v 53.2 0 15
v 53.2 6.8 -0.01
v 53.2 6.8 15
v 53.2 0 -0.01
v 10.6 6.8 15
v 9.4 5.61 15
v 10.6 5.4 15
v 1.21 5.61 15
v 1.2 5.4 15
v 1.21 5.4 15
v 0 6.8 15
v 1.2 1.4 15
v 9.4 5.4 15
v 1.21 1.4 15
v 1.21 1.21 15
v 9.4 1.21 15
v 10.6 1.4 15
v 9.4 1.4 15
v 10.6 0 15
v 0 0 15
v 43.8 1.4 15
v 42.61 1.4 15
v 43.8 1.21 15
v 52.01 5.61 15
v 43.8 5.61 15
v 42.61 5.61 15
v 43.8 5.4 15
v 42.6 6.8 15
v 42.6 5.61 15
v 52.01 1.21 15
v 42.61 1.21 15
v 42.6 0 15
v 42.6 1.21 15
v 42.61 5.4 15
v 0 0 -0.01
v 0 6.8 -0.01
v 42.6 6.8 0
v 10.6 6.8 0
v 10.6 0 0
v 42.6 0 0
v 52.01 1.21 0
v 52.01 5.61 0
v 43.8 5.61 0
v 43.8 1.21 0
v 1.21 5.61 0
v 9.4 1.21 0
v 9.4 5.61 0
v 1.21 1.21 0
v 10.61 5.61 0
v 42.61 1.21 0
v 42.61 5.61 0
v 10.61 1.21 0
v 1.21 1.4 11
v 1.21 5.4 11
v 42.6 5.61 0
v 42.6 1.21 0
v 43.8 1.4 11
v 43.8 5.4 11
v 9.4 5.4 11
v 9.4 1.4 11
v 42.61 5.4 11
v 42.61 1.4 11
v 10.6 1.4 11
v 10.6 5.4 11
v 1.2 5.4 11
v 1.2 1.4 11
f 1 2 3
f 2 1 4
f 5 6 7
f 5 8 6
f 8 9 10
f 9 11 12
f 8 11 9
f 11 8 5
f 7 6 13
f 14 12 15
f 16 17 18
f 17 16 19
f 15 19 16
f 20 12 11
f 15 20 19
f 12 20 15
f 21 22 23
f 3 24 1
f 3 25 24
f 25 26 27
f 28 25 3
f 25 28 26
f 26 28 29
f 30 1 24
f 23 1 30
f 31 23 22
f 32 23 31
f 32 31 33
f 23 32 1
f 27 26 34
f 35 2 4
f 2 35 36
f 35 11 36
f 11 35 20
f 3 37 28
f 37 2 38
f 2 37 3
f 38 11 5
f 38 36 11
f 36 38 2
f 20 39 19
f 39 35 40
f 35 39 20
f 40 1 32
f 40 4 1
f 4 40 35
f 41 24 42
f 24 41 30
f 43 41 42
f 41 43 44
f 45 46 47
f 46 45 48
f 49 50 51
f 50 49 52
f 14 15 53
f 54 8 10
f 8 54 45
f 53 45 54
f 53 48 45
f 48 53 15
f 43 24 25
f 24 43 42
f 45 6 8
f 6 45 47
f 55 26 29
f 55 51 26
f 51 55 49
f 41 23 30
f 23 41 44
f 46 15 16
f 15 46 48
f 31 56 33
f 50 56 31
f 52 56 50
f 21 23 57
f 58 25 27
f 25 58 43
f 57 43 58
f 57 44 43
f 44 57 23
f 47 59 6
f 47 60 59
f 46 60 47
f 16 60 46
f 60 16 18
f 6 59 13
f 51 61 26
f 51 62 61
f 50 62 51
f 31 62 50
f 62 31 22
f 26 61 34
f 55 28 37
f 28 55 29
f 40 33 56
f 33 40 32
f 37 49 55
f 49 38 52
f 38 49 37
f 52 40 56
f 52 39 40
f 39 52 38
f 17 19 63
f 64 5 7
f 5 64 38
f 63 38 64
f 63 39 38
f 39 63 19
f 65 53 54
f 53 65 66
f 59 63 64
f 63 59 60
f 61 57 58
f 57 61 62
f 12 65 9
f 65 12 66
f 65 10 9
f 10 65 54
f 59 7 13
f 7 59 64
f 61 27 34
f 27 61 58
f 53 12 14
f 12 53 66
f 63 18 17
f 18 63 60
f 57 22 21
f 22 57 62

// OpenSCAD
// file: ../Base/Boxes.scad
// Fischertechnik Box Foundation
// Pre-designed Boxes

use <Constants.scad>

include <PlacementOptions.scad>

box190Width = 190;
box190Depth = 130;
box130Width = 130;
box130Depth = 95;

// Values are from an original ec3 box
topBottomDifference = 1.5;
outerHeight = 40;
baseThickness = 1.8;
innerHeight = outerHeight - baseThickness;
stackExcess = 5.7;
radius = 3.5;
wallThickness = 1.5;
tolerance = 0.2;

boxWallThickness = wallThickness;
boxBaseThickness = baseThickness;
boxWebWidth = 3.0;

// getBoxWallThickness()
// Gets the wall thickness of a Fischertechnik Box
function getBoxWallThickness() = boxWallThickness;

// getBoxUsageHeight(height = 38.2)
// Gets the usable height of a Fischertechnik box
// height = Outer height of the box from the bottom to the upper edge.
function getBoxUsageHeight(height = outerHeight) = height - baseThickness - stackExcess;

// getBoxInnerHeight()
// Gets the inner height of a Fischertechnik box, including the stack excess
function getBoxInnerHeight() = innerHeight;

// getBoxBaseThickness()
// Gets the thickness of the Fischertechnik box base.
function getBoxBaseThickness() = boxBaseThickness;

// getBoxWebWidth()
// Gets the width of a box web
function getBoxWebWidth() = boxWebWidth;

// getBox190Space()
// Gets the usable inner space of a Box 190 as an x/y-list
function getBox190Space() = [
    box190Width - 2*getBoxWallThickness() - topBottomDifference, 
    box190Depth - 2*getBoxWallThickness() - topBottomDifference ];

// RoundedCornerPlate(width, depth, height, radius)
// Creates a body plate with rounded corners for a box. Used
// also to create the complete box with the hull module.
// width = Width of the plate
// depth = depth of the plate 
// height = thickness of the plate
// radius = radius of the rounded corner
module RoundedCornerPlate(width, depth, height, radius) {
    translate([radius, radius])
    hull() {
        w = width-2*radius;
        d = depth-2*radius;
        cube([w, d, height]);
        cylinder(height, r=radius, $fn=getFragments());
        translate([w, 0])
            cylinder(height, r=radius, $fn=getFragments());
        translate([w, d])
            cylinder(height, r=radius, $fn=getFragments());
        translate([0, d])
            cylinder(height, r=radius, $fn=getFragments());
    }
}

// BoxBase(width, depth)
// Creates an empty stackable Fischertechnik compatible box
// width = Outer width of the box (190, 130, ...)
// depth = Outer depth of the box (130, 95, ...)

module BoxBase(width, depth, height=outerHeight) {    
    thinPlate = 0.01;

    innerHeight = height - baseThickness;    
    
    module Body(tolerance=tolerance) {
        hull() {
            // Bottom with tolerance to fit into the original boxes when stacked
            translate([-wallThickness+tolerance, -wallThickness+tolerance, -baseThickness])
                RoundedCornerPlate(width-topBottomDifference-2*tolerance, depth-topBottomDifference-2*tolerance, thinPlate, radius);
            
            // Top
            translate([-wallThickness-topBottomDifference/2, -wallThickness-topBottomDifference/2, innerHeight-thinPlate])
                RoundedCornerPlate(width, depth, thinPlate, radius);
         }
    }

    module Cutoff() {
        hull() {
            coWidth = width - 2*wallThickness;
            coDepth = depth - 2*wallThickness;
            
            // Bottom
            RoundedCornerPlate(coWidth-topBottomDifference, coDepth-topBottomDifference, thinPlate, radius);

            // Top
            translate([-topBottomDifference/2, -topBottomDifference/2, innerHeight+thinPlate]) 
                RoundedCornerPlate(coWidth, coDepth, thinPlate, radius);
        }
    }
    
    difference() {        
        Body();
        Cutoff();
        stackOffset = innerHeight - stackExcess;
        translate([0, 0, stackOffset + baseThickness])
            Body(tolerance=0);
    }
}

// Creates the Fischertechnik empty box 130x190 mm and places it at position 0,0
// 190x130 are the outer sizes, the inner space is slightly smaller. Use getBox190Space() to get the inner sizes.
// The box is positioned that the usable inner space is at the 0,0,0 position.

module Box190() {
    BoxBase(box190Width, box190Depth);
}

// Gets the usable inner space of a Box 130 as an x/y-list
function getBox130Space() = [
    box130Width - 2*getBoxWallThickness() - topBottomDifference, 
    box130Depth - 2*getBoxWallThickness() - topBottomDifference ];

// Creates the Fischertechnik empty box 95x130 mm and places it at position 0,0
// 190x130 are the outer sizes, the inner space is slightly smaller. Use getBox190Space() to get the inner sizes.
// The box is positioned that the usable inner space is at the 0,0,0 position.

module Box130() {
    BoxBase(box130Width, box130Depth);
}

// Creates a web at the specified box walls
// corner 0 = LowerLeft, 1 = UpperLeft, 2 = UpperRight, 3 = LowerRight
// side 0 = LeftOfCorner, 1 = RightOfCorner
// distance = Distance in mm from the corner
// boxSpace = inner width and depth of the box (default: Box 190)
// webWidth = length of the web (default is 3 mms)
// webThickness = thickness of the web (default is 1 mm)
// height = Height of the web (standard is getBoxUsageHeight())
// sink = How much of the web is sunk into the wall

module BoxWeb(
    corner, 
    side, 
    distance, 
    boxSpace=getBox190Space(), 
    webWidth=getBoxWebWidth(), 
    webThickness=1.0, 
    height=getBoxUsageHeight(),
    sink = getBoxWallThickness()/2) {
    width = (corner % 2 == 0) ? 
            (side == LeftOfCorner ? webWidth : webThickness) :
            (side == LeftOfCorner ? webThickness : webWidth);

    depth = (corner % 2 == 0) ? 
            (side == RightOfCorner ? webWidth : webThickness) :
            (side == RightOfCorner ? webThickness : webWidth);
    
    xDiff = corner == LowerLeft ? 
                (side == LeftOfCorner ? -sink : distance) :
            (corner == UpperLeft ?                
                (side == LeftOfCorner ? distance : -sink) :
            (corner == UpperRight ?
                (side == LeftOfCorner ? boxSpace.x-webWidth+sink : boxSpace.x-distance-webThickness) :
                (side == LeftOfCorner ? boxSpace.x-distance-webThickness: boxSpace.x-webWidth+sink)));

    yDiff = corner == LowerLeft ? 
                (side == RightOfCorner ? -sink : distance) :
            (corner == UpperLeft ?
                (side == RightOfCorner ? boxSpace.y-distance-webThickness : boxSpace.y-webWidth+sink) :
            (corner == UpperRight ?
                (side == RightOfCorner ? boxSpace.y-webWidth+sink : boxSpace.y-distance-webThickness) :
                (side == RightOfCorner ? distance : -sink)));
    
    translate([xDiff, yDiff, -getExcess()])
        cube([width, depth, height + 2*getExcess()]);
}
// file: ../Base/Rotation.scad
// Fischertechnik Box Foundation
// Geometry Helpers Rotation

include <PlacementOptions.scad>

// getRotatedSpace(space, rotation=NoRotation)
// Rotates the space dependent on the specified rotation

function getRotatedSpace(space, rotation=NoRotation) = [
    (rotation == Rotate90 || rotation == Rotate270) ? space.y : space.x,
    (rotation == Rotate90 || rotation == Rotate270) ? space.x : space.y
];

// Rotates the given space around the fixed left lower corner
// space = the space the children needs as width/depth list [width,depth]
// rotation = 0 Rotate0 degrees, 1 Rotate90 degrees, 2 Rotate180 degrees, 3 Rotate270 degrees (equivalent to -90)

module RotateFix(space, rotation=NoRotation) {
    dy = (rotation == Rotate0 || rotation == Rotate270) ? 0 :
        (rotation == Rotate90) ? space.x :
        space.y;
    dx = (rotation < Rotate180) ? 0 :
        (rotation == Rotate180) ? space.x :
        space.y;
    
    translate([dx, dy, 0])
        rotate([0, 0, rotations[rotation]])
            children();
}
// file: ../Base/Alignment.scad
// Fischertechnik Box Foundation
// Geometry Helpers Alignment

include <PlacementOptions.scad>

// getAlignedX(elementWidth, spaceWidth, align=AlignRight, offset=0)
// Gets the aligned X offset of an element with the given
// width in the given space.
// elementWidth = The width of the element to positon
// spaceWidth = The space where the element should be aligned
// align = 0 AlignLeft, 1 AlignCenter, 2 AlignRight
// offset = an optional offset from the aligned position. When
// aligned left or centered, then positive values are in X direction.
// When aligned right then positive values are in negative X direction.

function getAlignedX(elementWidth, spaceWidth, align=AlignRight, offset=0) =
    (align == AlignLeft) ?
        offset :
        ((align == AlignCenter) ?
        (spaceWidth - elementWidth)/2 + offset :
        spaceWidth - offset - elementWidth);

// getAlignedY(elementDepth, spaceDepth, align=AlignTop, offset=0)
// Gets the aligned Y offset of an element with the given
// depth in the given space.
// elementDepth = The depth of the element to positon
// spaceDepth = The space where the element should be aligned
// align = 0 AlignBottom, 1 AlignCenter, 2 AlignTop
// offset = an optional offset from the aligned position. When
// aligned bottom or centered, then positive values are in Y direction.
// When aligned top then positive values are in negative Y direction.

function getAlignedY(elementDepth, spaceDepth, align=AlignTop, offset=0) =
    (align == AlignBottom) ?
        offset :
        ((align == AlignCenter) ?
        (spaceDepth - elementDepth)/2 + offset :
        spaceDepth - offset - elementDepth);
// file: ../Base/PlacementOptions.scad
// Fischertechnik Box Foundation
// Placement Options

// Alignment
NoAlign = 0;
AlignLeft = 1;
AlignBottom = 2;
AlignCenter = 3;
AlignRight = 4;
AlignTop = 5;

// Element rotation degree steps
rotations = [0, -90, -180, -270];

// Rotation
NoRotation = 0;
Rotate0 = 0;
Rotate90 = 1;
Rotate180 = 2;
Rotate270 = 3;

// Docking (seen from above)
NoDock = -1;
DockLeft = 0;
DockTop = 1;
DockRight = 2;
DockCorner = 2;
DockBottom = 3;

// Web corners
LowerLeft = 0;
UpperLeft = 1;
UpperRight = 2;
LowerRight = 3;

// Web position relative to corner
LeftOfCorner = 0;
RightOfCorner = 1;
// file: ../Base/Placement.scad
// Fischertechnik Box Foundation
// Geometry Helpers Placement

use <Constants.scad>
use <Alignment.scad>
use <Rotation.scad>
use <Boxes.scad>

include <PlacementOptions.scad>

// Place(x=0, y=0, elementSpace=[0,0], alignX=AlignLeft, alignY=AlignBottom, rotation=Rotate0, boxSpace=getBox190Space())
// Places the child at the specified position
// y = Y-Position. This is a relative position when an X aligment is specified.
// x = X-Position. This is a relative position when an Y aligment is specified.
// elementSpace = space of the element to be placed [x,y]
// alignX = -1=NoAlign, 0 AlignLeft, 1 AlignCenter, 3 AlignRight (elementSpace and boxSpace required!)
// alignY = -1=NoAlign, 2 AlignBottom, 1 AlignCenter, 4 AlignTop (elementSpace and boxSpace required!)
// rotation = 0 Rotate0 0 degrees, 1 Rotate90 90 degrees, 
// 2 Rotate180 180 degrees, 3 Rotate270 270 degrees (equivalent to -90)
// boxSpace = Inner space of the box where the placement occurs [x,y] - default is Box 190x130 inner space

module Place(x=0, y=0, elementSpace=[0,0], 
  alignX=AlignLeft, alignY=AlignBottom, 
  rotation=NoRotation, boxSpace=getBox190Space()) {

    module Position(x, y, space, rotation=Rotate0) {
        translate([x, y, 0])
            RotateFix(space, rotation)
                children();
    }

    space = getRotatedSpace(elementSpace, rotation);
    alignedX = getAlignedX(space.x, boxSpace.x, alignX, x);
    alignedY = getAlignedY(space.y, boxSpace.y, alignY, y);
    Position(alignedX, alignedY, elementSpace, rotation)
        children();
}

// Center(space=getBox130Space(), elementSpace=[0,0])
// space = Space where the children is centered. For cylinder use centered=true and no elementSpace.
// elementSpace = space of the element to be centered [x,y]

module Center(space=getBox190Space(), elementSpace=[0,0]) {
    Place(elementSpace=elementSpace, boxSpace=space, alignX=AlignCenter, alignY=AlignCenter)
        children();
}

// CenterHorizontal(width=0, y=0, offset=0, space=getBox130Space())
// width = Width of the element to be placed.
// y = Y position of the element
// offset = Offset from the center position (negative will be left of the center)
// space = Space where the element is placed

module CenterHorizontal(width=0, y=0, offset=0, space=getBox190Space()) {
    Place(x=offset, y=y, elementSpace=[width, 0], boxSpace=space, alignX=AlignCenter)
        children(0);
}

// CenterVertical(depth=0, x=0, offset=0, space=getBox130Space())
// depth = Depth of the element to be placed.
// x = X position of the element
// offset = Offset from the center position (negative will be down of the center)
// space = Space where the element is placed

module CenterVertical(depth=0, x=0, offset=0, space=getBox190Space()) {
    Place(x=x, y=offset, elementSpace=[0, depth], boxSpace=space, alignY=AlignCenter)
        children(0);
}

// getIsVertical(align)
// True if the specified alignment needs a vertical orientation for a divider (AlignRight, AlignLeft)

function getIsVertical(align) = (align == AlignRight || align == AlignLeft);

// getIsHorizontal(align)
// True if the specified alignment needs a horizontal orientation for a divider (AlignTop, AlignBottom)

function getIsHorizontal(align) = (align == AlignTop || align == AlignBottom);
// file: ../Base/Constants.scad
// Fischertechnik Box Foundation
// Constants

// Constant values necessary for multiple elements

// Base constants
dividerThickness = 1.2;
excess = 0.01;
fragments = 90;
tolerance = 0.8;

// Gets the thickness of a divider 
function getDividerThickness() = dividerThickness;

// Gets the excess that is used to merge walls into each other
function getExcess() = excess;

// Gets amount of fragments of a cylinder
function getFragments() = fragments;

// Gets the inner tolerance of a frame to each side
function getTolerance() = tolerance;


// Fischertechnik specific constants
axisDiameter = 4;
axisBottomDiameter = axisDiameter + 1;
axisTolerance = 0.2;

// Gets axis diameter of Fischertechnik axis
function getAxisDiameter() = axisDiameter;

// Gets axis diameter tolerance (subtracted for element axis)
function getAxisTolerance() = axisTolerance;

// Gets the axis diameter for standing axis
function getStandAxisDiameter() = getAxisDiameter() - getAxisTolerance();

// Gets axis bottom diameter for thicker part at the bottom
function getAxisBottomDiameter() = axisBottomDiameter;

pinHeight = 2.5;

// gets the height of a connecting pin
function getPinHeight() = pinHeight;

standardEdgeDistance = 2.5;
standardWebDistance = 11.5;
standardCornerLength = 15;

// gets the standard distance to the wall of the box for dockable frames with webs
function getStandardEdgeDistance() = standardEdgeDistance;

// gets the standard distance of each web to the corner of the dockable frame
function getStandardWebDistance() = standardWebDistance;

// gets the standard length of the corner walls of a dockable frame
function getStandardCornerLength() = standardCornerLength;

tubeWallFactor = 0.8;

// gets the wall thickness of a tube.
function getTubeWallThickness() = tubeWallFactor * getDividerThickness();

smallPartsFrameHeight = 20;

// gets the frame height for docked small parts boxes.
function getSmallPartsFrameHeight() = smallPartsFrameHeight;

hubRingDiameter = 19.5;
hubRingLevelDiameter = 21;

// gets the diameter of a tube matching the inner ring of a wheel
function getHubRingDiameter() = hubRingDiameter;

// gets the diameter of a hub tube with a thicker diameter
function getHubRingLevelDiameter() = hubRingLevelDiameter;
// main file
// Fischertechnik Box Library
// Frame for single 50 mm Axis
// 31033

use <../ModelBase/Complex.scad>

/* [Hidden] */
length = 50;

// getFrameAxis50Space()
// Gets the width (.x) and depth (.y) of the axis frame.

function getFrameAxis50Space() = getFrameAxisSpace(length);

// FrameAxis50()
// Axis holder for a single 50 mm axis.

module FrameAxis50() {
    FrameAxis(length);
}

// Test
color("lightgray")
FrameAxis50();
